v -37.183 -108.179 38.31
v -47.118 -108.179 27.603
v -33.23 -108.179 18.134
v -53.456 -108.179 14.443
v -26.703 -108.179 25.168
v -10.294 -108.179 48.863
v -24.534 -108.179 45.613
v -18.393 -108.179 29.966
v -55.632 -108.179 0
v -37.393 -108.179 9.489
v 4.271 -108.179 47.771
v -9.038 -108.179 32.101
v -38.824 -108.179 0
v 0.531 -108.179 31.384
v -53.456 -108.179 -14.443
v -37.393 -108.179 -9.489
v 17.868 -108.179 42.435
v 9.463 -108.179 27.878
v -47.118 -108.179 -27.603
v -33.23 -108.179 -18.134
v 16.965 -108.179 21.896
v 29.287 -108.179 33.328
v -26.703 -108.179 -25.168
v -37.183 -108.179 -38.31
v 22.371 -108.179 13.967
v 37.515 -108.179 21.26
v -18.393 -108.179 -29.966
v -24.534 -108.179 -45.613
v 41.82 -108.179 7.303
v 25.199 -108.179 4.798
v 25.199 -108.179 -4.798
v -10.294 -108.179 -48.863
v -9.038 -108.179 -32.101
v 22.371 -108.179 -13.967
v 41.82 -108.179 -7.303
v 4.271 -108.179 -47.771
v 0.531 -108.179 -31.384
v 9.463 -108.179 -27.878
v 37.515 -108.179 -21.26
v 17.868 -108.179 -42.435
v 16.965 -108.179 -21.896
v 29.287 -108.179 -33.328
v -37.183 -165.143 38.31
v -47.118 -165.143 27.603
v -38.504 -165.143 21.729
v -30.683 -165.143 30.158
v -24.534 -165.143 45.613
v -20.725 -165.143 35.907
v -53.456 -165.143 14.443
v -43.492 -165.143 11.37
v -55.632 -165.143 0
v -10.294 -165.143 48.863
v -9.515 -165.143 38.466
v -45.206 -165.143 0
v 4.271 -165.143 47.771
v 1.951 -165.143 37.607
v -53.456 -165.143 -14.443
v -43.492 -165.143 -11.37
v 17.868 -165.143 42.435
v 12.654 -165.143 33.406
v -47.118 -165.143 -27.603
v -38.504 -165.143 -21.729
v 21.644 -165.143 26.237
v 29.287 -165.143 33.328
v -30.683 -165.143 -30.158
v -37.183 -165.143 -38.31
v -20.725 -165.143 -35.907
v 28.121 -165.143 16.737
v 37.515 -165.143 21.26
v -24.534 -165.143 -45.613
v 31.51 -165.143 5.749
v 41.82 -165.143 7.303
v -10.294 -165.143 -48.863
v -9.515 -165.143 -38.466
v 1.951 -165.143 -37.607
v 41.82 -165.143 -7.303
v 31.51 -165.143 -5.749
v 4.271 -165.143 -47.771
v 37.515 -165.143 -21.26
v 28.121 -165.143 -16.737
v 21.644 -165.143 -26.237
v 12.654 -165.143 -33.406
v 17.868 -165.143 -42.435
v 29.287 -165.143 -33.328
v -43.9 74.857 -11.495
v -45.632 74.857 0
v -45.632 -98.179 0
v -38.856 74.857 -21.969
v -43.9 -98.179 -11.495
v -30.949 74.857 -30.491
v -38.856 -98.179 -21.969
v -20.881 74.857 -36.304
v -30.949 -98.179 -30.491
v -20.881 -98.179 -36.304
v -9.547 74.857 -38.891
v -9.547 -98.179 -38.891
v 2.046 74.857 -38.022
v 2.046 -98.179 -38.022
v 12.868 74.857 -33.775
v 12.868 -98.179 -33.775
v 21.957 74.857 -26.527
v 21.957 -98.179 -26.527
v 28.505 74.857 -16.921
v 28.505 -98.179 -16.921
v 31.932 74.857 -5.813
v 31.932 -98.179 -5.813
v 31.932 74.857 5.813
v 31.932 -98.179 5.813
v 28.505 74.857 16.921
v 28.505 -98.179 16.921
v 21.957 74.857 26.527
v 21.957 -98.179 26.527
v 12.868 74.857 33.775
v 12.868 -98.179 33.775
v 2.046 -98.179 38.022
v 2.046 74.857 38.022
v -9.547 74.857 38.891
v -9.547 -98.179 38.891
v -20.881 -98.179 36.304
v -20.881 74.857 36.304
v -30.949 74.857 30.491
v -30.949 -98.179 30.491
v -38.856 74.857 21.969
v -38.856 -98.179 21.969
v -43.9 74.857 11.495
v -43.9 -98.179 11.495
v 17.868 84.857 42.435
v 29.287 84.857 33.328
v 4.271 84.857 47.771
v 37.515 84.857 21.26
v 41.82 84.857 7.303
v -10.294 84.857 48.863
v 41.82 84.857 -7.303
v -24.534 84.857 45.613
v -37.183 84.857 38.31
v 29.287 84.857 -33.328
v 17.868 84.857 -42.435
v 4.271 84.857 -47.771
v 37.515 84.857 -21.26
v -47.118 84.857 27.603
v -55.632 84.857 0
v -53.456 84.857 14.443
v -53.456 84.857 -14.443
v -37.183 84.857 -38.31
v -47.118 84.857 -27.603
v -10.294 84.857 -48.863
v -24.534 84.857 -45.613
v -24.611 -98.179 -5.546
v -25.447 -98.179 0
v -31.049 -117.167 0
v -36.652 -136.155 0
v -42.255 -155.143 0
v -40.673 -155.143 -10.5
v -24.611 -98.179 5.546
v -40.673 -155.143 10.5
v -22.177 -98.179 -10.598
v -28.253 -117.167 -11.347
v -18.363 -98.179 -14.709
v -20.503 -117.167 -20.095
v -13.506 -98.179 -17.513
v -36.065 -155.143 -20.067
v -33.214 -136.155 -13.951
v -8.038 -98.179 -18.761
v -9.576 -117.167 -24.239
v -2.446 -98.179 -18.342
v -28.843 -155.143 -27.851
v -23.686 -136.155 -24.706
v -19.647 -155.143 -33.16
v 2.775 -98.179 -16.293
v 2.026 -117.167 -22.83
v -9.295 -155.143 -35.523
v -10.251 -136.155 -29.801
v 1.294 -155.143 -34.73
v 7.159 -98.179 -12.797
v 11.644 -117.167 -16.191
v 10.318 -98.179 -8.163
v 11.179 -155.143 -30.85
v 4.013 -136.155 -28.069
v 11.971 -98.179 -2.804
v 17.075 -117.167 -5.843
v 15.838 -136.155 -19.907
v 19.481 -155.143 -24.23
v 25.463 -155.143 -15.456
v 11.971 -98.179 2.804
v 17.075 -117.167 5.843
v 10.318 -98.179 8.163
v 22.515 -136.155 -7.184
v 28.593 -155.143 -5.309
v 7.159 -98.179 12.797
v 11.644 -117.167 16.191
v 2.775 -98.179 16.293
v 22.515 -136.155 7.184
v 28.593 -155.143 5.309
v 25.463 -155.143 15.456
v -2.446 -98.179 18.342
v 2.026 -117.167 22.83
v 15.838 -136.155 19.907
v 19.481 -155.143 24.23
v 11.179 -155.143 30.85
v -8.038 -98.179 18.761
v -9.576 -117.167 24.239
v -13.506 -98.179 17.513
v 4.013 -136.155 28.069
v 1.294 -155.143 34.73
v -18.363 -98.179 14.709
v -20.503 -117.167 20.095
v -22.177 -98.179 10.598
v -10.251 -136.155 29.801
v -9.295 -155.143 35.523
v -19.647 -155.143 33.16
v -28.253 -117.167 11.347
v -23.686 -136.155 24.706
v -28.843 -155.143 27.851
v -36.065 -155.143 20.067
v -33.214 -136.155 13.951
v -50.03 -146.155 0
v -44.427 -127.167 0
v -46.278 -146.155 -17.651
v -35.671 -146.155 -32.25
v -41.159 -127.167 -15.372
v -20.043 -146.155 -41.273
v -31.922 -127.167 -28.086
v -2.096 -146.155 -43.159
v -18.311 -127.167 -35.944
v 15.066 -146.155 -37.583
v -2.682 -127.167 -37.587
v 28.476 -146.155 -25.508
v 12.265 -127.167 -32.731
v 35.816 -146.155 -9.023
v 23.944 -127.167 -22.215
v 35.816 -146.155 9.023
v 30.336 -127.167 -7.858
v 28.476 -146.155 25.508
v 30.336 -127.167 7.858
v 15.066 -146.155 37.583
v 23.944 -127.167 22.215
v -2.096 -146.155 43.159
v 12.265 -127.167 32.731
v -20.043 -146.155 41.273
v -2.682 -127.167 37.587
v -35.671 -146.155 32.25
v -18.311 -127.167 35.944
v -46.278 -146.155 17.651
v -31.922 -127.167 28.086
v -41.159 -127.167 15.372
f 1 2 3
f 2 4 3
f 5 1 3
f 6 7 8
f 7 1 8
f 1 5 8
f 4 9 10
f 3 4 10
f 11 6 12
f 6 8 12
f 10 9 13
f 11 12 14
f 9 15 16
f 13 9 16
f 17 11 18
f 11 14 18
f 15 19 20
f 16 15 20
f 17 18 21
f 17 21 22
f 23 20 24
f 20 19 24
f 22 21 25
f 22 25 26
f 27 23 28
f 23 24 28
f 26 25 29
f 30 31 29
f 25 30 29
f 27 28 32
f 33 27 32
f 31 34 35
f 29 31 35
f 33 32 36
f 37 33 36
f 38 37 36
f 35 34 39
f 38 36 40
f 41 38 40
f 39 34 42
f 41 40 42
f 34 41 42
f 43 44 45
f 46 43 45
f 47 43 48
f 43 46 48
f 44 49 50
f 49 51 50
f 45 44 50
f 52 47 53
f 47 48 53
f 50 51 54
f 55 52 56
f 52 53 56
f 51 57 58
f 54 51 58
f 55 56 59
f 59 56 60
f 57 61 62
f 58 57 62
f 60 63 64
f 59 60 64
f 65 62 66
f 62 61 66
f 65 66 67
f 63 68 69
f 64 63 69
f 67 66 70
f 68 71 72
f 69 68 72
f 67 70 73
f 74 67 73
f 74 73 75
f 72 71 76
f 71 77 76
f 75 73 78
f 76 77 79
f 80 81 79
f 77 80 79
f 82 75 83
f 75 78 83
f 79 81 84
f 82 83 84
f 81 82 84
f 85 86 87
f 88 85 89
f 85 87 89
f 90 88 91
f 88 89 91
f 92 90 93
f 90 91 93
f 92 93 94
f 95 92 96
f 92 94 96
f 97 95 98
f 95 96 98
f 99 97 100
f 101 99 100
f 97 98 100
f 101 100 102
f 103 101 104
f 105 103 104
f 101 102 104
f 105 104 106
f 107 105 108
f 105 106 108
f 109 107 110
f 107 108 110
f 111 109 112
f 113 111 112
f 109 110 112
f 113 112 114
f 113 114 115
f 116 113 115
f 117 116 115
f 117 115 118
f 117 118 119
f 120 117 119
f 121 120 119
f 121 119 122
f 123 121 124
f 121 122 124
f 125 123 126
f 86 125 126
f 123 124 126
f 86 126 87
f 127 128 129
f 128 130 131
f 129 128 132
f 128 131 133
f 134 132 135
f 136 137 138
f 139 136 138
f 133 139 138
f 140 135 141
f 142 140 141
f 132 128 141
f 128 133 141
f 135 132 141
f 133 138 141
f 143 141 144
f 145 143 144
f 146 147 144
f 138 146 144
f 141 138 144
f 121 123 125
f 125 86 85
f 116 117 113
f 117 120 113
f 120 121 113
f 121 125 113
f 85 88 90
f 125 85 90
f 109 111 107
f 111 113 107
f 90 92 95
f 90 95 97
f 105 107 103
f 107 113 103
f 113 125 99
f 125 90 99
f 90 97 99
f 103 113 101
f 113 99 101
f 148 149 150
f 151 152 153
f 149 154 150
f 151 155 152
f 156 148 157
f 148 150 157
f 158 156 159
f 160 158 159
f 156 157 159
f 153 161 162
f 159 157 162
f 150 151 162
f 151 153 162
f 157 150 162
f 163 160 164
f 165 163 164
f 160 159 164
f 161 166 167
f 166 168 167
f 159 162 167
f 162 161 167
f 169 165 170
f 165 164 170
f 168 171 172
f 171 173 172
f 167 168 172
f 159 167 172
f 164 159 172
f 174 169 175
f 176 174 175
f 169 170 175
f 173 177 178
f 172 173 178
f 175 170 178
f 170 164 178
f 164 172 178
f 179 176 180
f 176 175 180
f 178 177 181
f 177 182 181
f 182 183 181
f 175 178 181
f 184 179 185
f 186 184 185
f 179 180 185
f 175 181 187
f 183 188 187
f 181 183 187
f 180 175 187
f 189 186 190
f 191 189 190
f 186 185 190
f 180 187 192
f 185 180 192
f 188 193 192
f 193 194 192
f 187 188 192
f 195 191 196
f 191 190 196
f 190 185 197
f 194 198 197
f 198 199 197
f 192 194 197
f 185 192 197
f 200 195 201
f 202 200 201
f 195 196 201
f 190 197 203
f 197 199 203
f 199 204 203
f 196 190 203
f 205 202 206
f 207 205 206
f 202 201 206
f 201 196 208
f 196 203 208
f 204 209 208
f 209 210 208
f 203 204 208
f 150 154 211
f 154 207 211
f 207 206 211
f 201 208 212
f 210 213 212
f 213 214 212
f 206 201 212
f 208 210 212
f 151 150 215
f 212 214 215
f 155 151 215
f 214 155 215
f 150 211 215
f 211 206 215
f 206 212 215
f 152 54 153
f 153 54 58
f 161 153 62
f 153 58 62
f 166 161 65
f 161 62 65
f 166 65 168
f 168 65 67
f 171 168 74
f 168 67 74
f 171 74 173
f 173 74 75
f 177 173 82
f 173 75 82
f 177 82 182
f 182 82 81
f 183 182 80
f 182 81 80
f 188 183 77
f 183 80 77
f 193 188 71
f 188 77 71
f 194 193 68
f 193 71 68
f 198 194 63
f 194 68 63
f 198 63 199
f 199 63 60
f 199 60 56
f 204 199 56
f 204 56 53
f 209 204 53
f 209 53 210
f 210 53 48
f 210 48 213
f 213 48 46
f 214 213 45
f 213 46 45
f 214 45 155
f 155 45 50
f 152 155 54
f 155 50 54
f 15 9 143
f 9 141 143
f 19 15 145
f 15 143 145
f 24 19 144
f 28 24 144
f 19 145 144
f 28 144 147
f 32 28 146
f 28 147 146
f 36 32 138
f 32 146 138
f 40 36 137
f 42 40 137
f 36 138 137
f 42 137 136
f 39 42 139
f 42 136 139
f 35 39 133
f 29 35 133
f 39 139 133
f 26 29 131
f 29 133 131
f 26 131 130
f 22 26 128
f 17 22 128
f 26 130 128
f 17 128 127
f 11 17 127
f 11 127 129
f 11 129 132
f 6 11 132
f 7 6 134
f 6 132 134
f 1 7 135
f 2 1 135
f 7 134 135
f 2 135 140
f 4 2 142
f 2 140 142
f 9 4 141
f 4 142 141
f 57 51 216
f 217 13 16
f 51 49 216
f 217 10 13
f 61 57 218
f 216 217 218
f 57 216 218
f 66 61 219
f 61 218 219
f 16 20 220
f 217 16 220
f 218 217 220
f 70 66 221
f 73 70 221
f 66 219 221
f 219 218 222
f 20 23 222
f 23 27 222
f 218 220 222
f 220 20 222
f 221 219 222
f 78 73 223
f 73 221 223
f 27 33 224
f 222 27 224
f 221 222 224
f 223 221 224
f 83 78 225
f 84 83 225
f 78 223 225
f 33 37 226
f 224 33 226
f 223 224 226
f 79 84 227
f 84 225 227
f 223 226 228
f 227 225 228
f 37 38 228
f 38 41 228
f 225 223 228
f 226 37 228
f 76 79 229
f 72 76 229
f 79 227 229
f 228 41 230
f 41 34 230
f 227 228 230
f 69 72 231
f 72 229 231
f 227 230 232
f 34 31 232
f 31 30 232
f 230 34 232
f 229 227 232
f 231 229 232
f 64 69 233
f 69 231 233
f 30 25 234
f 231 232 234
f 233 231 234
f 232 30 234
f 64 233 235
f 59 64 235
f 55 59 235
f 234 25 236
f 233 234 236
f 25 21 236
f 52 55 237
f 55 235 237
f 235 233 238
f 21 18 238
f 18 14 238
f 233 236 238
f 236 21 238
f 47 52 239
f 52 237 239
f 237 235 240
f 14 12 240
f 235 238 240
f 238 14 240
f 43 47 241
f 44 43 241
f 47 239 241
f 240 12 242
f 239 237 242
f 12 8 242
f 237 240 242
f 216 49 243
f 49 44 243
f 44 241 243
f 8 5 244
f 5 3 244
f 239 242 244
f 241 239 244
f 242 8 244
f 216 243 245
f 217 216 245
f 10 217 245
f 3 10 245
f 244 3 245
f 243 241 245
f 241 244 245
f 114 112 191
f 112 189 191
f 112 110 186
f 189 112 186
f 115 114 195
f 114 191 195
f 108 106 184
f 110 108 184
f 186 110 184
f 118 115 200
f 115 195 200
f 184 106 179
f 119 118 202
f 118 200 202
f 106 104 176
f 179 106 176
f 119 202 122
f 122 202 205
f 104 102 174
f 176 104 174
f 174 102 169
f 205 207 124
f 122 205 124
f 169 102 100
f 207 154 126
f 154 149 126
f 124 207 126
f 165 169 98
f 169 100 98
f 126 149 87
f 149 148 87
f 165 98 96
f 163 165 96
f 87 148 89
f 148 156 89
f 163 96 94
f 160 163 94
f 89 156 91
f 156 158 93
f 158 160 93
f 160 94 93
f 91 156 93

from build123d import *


with BuildPart() as part:
    # Esquisse1 → Révolution1 (revolve)
    with BuildSketch(Plane.XY):
        Polygon((-6.63246603, 74.857346398), (-45.63246603, 74.857346398), (-45.63246603, -98.179299131), (-25.446506602, -98.179299131), (-42.255365298, -155.142653602), (-45.20618497, -165.142653602), (-55.63246603, -165.142653602), (-38.823607333, -108.179299131), (-55.63246603, -108.179299131), (-55.63246603, 84.857346398), (-6.63246603, 84.857346398), align=None)
    revolve(axis=Axis((-6.63246603, 84.857346398, 0), (0, -1, 0)))


solid = part.part
